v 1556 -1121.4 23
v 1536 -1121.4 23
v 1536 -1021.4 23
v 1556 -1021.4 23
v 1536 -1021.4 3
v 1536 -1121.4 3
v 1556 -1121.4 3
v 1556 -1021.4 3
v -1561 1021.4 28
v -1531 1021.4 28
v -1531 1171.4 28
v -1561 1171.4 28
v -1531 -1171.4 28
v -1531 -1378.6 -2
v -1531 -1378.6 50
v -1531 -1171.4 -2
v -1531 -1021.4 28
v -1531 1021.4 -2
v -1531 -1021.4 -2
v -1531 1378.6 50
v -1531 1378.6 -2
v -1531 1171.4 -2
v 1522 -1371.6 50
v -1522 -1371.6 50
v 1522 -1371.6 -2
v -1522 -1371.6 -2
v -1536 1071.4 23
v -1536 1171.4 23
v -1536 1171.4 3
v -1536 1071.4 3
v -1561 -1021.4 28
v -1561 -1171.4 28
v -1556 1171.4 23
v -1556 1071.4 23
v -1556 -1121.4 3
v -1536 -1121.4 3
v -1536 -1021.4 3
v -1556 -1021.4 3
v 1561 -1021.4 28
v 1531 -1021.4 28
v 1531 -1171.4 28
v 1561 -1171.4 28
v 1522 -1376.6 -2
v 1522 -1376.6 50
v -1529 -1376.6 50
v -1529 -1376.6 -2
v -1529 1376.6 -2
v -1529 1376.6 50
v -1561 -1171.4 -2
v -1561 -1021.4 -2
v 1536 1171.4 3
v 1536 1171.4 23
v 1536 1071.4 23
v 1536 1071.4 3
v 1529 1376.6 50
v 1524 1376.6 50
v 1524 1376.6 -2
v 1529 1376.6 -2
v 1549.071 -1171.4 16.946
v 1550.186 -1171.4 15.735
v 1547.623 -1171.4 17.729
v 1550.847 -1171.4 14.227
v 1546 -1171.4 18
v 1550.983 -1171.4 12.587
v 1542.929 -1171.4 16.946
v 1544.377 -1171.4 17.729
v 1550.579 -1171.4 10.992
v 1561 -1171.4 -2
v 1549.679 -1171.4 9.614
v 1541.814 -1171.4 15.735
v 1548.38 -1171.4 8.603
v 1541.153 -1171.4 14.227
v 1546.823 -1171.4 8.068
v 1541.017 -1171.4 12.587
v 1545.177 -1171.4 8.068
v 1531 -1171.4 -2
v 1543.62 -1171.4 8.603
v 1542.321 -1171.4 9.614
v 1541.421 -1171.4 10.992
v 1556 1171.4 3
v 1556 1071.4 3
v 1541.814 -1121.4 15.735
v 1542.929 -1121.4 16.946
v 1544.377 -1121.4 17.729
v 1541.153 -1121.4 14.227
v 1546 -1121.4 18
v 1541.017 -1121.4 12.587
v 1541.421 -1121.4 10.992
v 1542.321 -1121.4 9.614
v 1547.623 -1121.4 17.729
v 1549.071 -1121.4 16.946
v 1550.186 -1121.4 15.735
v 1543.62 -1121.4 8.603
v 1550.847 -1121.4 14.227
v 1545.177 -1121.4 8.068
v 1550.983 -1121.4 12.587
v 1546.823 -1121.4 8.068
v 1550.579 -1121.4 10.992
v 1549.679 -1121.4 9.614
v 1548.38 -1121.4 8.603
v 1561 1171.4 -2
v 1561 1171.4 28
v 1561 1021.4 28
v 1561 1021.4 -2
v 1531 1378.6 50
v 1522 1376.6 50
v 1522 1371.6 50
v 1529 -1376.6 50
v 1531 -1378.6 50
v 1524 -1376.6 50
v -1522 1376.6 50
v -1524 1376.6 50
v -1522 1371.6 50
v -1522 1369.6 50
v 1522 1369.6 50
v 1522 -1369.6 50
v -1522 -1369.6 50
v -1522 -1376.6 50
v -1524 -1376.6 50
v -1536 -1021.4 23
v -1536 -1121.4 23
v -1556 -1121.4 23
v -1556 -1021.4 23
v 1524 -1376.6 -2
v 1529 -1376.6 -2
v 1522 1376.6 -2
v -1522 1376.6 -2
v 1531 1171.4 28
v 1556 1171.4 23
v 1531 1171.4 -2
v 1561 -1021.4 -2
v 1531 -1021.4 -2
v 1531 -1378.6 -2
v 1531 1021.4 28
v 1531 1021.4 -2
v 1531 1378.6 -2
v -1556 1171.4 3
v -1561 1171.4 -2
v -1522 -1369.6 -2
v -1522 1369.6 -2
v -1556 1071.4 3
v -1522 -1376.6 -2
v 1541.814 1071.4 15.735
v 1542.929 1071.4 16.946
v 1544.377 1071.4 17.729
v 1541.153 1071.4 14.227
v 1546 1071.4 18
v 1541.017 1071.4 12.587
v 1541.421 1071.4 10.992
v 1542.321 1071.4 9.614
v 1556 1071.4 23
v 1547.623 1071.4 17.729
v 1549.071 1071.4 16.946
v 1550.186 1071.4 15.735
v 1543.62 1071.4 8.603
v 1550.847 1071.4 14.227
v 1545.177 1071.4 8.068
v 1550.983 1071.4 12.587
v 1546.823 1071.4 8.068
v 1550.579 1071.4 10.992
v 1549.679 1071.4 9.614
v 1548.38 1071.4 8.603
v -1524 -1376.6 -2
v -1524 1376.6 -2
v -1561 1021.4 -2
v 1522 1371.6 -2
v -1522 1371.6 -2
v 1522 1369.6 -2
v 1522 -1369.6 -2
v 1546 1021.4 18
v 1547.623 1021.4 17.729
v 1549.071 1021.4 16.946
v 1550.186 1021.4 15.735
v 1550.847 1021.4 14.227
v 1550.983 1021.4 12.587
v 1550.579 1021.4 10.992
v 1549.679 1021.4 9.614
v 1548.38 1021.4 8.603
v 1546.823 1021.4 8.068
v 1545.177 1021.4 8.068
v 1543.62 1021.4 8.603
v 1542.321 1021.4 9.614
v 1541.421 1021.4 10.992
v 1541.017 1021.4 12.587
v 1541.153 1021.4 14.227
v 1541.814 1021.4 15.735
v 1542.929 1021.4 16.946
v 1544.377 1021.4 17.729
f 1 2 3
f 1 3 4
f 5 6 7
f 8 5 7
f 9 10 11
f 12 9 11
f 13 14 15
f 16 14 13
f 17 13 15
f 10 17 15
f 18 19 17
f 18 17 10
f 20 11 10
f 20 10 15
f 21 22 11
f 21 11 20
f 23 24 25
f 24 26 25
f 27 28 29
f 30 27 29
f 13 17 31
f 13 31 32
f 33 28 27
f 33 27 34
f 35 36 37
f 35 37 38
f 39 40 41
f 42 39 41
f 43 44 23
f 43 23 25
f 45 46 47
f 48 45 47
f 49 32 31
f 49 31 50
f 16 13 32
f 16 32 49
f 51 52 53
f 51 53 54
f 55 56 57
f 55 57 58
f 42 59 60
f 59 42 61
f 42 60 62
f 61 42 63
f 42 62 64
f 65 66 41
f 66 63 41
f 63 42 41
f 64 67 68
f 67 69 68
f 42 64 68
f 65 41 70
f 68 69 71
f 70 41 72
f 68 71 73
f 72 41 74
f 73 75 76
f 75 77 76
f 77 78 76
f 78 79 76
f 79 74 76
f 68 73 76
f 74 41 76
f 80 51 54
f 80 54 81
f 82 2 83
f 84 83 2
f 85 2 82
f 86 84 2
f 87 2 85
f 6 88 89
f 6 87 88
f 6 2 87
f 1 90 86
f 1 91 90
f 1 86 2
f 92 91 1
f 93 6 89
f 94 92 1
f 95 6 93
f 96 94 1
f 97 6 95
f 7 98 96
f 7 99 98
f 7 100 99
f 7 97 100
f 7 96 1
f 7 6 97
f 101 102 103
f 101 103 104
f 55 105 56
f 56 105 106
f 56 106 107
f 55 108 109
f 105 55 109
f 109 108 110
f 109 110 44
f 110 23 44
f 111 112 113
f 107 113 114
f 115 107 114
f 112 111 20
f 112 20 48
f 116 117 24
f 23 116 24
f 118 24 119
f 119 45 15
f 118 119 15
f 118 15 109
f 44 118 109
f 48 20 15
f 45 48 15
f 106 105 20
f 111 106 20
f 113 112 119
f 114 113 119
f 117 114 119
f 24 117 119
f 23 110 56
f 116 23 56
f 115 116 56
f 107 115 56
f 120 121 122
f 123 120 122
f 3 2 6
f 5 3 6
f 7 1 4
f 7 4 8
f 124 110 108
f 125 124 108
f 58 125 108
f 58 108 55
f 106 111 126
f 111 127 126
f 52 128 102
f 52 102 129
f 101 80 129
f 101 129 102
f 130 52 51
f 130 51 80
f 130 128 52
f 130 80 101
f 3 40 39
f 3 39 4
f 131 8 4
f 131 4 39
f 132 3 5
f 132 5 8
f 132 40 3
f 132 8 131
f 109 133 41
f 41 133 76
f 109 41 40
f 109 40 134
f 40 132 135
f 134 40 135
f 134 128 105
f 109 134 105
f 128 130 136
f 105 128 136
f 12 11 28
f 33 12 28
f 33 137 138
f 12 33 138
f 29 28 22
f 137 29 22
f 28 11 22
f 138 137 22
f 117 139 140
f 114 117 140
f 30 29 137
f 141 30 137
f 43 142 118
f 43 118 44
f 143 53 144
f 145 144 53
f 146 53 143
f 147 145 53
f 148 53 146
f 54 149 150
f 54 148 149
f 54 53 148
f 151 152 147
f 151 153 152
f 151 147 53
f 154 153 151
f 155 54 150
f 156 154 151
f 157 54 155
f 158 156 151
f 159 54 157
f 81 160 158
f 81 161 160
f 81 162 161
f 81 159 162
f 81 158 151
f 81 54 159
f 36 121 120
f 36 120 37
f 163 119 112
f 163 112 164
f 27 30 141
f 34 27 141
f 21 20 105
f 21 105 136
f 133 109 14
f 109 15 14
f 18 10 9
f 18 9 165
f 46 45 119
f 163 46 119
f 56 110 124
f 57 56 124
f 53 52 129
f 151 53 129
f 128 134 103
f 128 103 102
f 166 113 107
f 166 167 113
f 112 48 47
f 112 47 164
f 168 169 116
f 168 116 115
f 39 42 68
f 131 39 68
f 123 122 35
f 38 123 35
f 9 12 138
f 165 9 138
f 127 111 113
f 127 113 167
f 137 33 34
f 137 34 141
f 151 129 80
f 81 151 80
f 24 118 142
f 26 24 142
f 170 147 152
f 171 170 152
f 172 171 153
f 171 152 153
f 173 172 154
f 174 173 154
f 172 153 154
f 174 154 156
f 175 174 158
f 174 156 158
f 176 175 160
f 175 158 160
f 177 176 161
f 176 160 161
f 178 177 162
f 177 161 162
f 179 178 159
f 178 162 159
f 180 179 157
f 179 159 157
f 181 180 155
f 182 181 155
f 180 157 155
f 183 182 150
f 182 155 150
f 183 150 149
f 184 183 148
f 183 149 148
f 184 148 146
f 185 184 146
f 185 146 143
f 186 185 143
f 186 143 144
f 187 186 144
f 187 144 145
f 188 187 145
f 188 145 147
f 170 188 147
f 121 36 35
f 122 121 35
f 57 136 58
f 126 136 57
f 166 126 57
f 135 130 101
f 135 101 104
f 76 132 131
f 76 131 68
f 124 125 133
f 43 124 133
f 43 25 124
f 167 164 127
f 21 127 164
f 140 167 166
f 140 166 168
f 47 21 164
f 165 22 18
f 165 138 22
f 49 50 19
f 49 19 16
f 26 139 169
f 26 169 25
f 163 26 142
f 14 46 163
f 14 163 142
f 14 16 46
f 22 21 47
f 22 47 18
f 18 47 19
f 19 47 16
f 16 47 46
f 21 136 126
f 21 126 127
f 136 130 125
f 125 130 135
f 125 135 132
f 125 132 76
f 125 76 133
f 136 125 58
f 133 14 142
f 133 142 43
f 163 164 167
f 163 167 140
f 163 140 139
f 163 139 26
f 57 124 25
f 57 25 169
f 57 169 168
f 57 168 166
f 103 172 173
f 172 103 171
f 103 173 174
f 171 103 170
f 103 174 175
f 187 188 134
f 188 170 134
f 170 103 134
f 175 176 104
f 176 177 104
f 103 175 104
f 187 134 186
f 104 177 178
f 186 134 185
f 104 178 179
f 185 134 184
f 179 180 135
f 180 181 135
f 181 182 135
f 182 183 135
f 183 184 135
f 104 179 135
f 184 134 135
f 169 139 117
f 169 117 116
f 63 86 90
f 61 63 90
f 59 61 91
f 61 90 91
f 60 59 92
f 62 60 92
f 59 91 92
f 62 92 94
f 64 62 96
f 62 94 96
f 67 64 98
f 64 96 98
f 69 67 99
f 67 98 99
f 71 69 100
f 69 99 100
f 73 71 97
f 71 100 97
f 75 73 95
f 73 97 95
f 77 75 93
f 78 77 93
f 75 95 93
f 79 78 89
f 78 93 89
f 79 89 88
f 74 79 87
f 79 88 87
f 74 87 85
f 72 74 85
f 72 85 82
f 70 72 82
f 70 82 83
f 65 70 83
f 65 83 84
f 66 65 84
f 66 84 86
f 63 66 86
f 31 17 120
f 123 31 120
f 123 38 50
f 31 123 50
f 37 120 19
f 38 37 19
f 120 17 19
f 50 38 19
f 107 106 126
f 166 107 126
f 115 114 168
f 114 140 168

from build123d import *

# Parameters (mm, degrees)
SKETCH1_W               = 3058
SKETCH1_H               = 2753.2
SKETCH1_W_2             = 3048
SKETCH1_H_2             = 2743.2
BOSS_EXTRUDE1_DEPTH     = 50
SHELL4_T                = 2
SKETCH2_W               = 3058
SKETCH2_H               = 2753.2
SKETCH2_W_2             = 3048
SKETCH2_H_2             = 2743.2
CUT_EXTRUDE5_DEPTH      = 5
SKETCH3_W               = 30
SKETCH3_H               = 150
BOSS_EXTRUDE2_DEPTH     = 30
SKETCH4_W               = 20
SKETCH4_H               = 20
CUT_EXTRUDE6_DEPTH      = 100
SKETCH5_W               = 20
SKETCH5_H               = 20
CUT_EXTRUDE7_DEPTH      = 100
MIRROR2_COPY_1_SKETCH_W = 30
MIRROR2_COPY_1_SKETCH_H = 150
MIRROR2_COPY_1_DEPTH    = 30
SKETCH6_R               = 5
CUT_EXTRUDE8_DEPTH      = 2490
SKETCH7_W               = 52
SKETCH7_H               = 7
BOSS_EXTRUDE3_DEPTH     = 2
MIRROR5_COPY_1_SKETCH_W = 52
MIRROR5_COPY_1_SKETCH_H = 7
MIRROR5_COPY_1_DEPTH    = 2


with BuildPart() as part:
    # Sketch1 → Boss-Extrude1 (new body)
    with BuildSketch(Plane.XY):
        Rectangle(SKETCH1_W, SKETCH1_H)
        Rectangle(SKETCH1_W_2, SKETCH1_H_2, mode=Mode.SUBTRACT)
    extrude(amount=BOSS_EXTRUDE1_DEPTH)

    # Shell4
    shell4_openings = [part.faces().sort_by_distance(p)[0] for p in [
        (-1524.885212735, 0, 50),
    ]]
    offset(amount=SHELL4_T, openings=shell4_openings, kind=Kind.INTERSECTION)

    # Sketch2 → Cut-Extrude5 (cut, symmetric)
    with BuildSketch(Plane.XY):
        Rectangle(SKETCH2_W, SKETCH2_H)
        Rectangle(SKETCH2_W_2, SKETCH2_H_2, mode=Mode.SUBTRACT)
    extrude(amount=CUT_EXTRUDE5_DEPTH, both=True, mode=Mode.SUBTRACT)


with BuildPart() as cut_extrude5_piece_1:
    # of the separate pieces the step leaves, piece 1, a body of its own (cut_extrude5_pieces)
    add(part.part.solids().sort_by_distance((-1529, -1376.6, -2))[0])

    # Sketch3 → Boss-Extrude2 (add)
    with BuildSketch(Plane(origin=(1531, 0, 0), x_dir=(0, 0, -1), z_dir=(1, 0, 0))):
        with Locations((-13, 1096.4)):
            Rectangle(SKETCH3_W, SKETCH3_H)
    boss_extrude2 = extrude(amount=BOSS_EXTRUDE2_DEPTH)

    # Sketch4 → Cut-Extrude6 (cut)
    with BuildSketch(Plane(origin=(0, 1171.4, 0), x_dir=(1, 0, 0), z_dir=(0, 1, 0))):
        with Locations((1546, -13)):
            Rectangle(SKETCH4_W, SKETCH4_H)
    cut_extrude6 = extrude(amount=-CUT_EXTRUDE6_DEPTH, mode=Mode.SUBTRACT)

    # Mirror1: Boss-Extrude2 across plane
    add(boss_extrude2.mirror(Plane.ZX))

    # Sketch5 → Cut-Extrude7 (cut)
    with BuildSketch(Plane(origin=(0, -1021.4, 0), x_dir=(1, 0, 0), z_dir=(0, 1, 0))):
        with Locations((1546, -13)):
            Rectangle(SKETCH5_W, SKETCH5_H)
    cut_extrude7 = extrude(amount=-CUT_EXTRUDE7_DEPTH, mode=Mode.SUBTRACT)

    # Mirror2: Boss-Extrude2 across plane
    add(boss_extrude2.mirror(Plane(origin=(0, 0, 0), x_dir=(0, 0, 1), z_dir=(1, 0, 0))))

    # Mirror2 copy 1 sketch → Mirror2 copy 1 (add)
    with BuildSketch(Plane(origin=(-1531, 0, 0), x_dir=(0, 0, -1), z_dir=(-1, 0, 0))):
        with Locations((-13, 1096.4)):
            Rectangle(MIRROR2_COPY_1_SKETCH_W, MIRROR2_COPY_1_SKETCH_H)
    extrude(amount=MIRROR2_COPY_1_DEPTH)

    # Mirror3: Cut-Extrude6, Cut-Extrude7 across plane
    add(cut_extrude6.mirror(Plane(origin=(0, 0, 0), x_dir=(0, 0, 1), z_dir=(1, 0, 0))), mode=Mode.SUBTRACT)
    add(cut_extrude7.mirror(Plane(origin=(0, 0, 0), x_dir=(0, 0, 1), z_dir=(1, 0, 0))), mode=Mode.SUBTRACT)

    # Sketch6 → Cut-Extrude8 (cut)
    with BuildSketch(Plane(origin=(0, 1071.4, 0), x_dir=(1, 0, 0), z_dir=(0, 1, 0))):
        with Locations(Location((1546, -13, 0), (0, 0, 270))):
            Circle(SKETCH6_R)
    extrude(amount=-CUT_EXTRUDE8_DEPTH, mode=Mode.SUBTRACT)



with BuildPart() as cut_extrude5_piece_2:
    # of the separate pieces the step leaves, piece 2, a body of its own (cut_extrude5_pieces)
    add(part.part.solids().sort_by_distance((-1524, 1371.6, -2))[0])


with BuildPart() as cut_extrude5_piece_1_1:
    add(cut_extrude5_piece_1.part)

    add(cut_extrude5_piece_2.part)  # Boss-Extrude3 merges Cut-Extrude5 piece 2
    # Sketch7 → Boss-Extrude3 (add)
    with BuildSketch(Plane(origin=(1524, 0, 0), x_dir=(0, 0, -1), z_dir=(1, 0, 0))):
        with Locations((-24, 1375.1)):
            Rectangle(SKETCH7_W, SKETCH7_H)
    boss_extrude3 = extrude(amount=-BOSS_EXTRUDE3_DEPTH)

    # Mirror4: Boss-Extrude3 across plane
    add(boss_extrude3.mirror(Plane.ZX))

    # Mirror5: Boss-Extrude3 across plane
    add(boss_extrude3.mirror(Plane(origin=(0, 0, 0), x_dir=(0, 0, 1), z_dir=(1, 0, 0))))

    # Mirror5 copy 1 sketch → Mirror5 copy 1 (add)
    with BuildSketch(Plane(origin=(-1524, 0, 0), x_dir=(0, 0, -1), z_dir=(-1, 0, 0))):
        with Locations((-24, 1375.1)):
            Rectangle(MIRROR5_COPY_1_SKETCH_W, MIRROR5_COPY_1_SKETCH_H)
    extrude(amount=-MIRROR5_COPY_1_DEPTH)


solid = cut_extrude5_piece_1_1.part
